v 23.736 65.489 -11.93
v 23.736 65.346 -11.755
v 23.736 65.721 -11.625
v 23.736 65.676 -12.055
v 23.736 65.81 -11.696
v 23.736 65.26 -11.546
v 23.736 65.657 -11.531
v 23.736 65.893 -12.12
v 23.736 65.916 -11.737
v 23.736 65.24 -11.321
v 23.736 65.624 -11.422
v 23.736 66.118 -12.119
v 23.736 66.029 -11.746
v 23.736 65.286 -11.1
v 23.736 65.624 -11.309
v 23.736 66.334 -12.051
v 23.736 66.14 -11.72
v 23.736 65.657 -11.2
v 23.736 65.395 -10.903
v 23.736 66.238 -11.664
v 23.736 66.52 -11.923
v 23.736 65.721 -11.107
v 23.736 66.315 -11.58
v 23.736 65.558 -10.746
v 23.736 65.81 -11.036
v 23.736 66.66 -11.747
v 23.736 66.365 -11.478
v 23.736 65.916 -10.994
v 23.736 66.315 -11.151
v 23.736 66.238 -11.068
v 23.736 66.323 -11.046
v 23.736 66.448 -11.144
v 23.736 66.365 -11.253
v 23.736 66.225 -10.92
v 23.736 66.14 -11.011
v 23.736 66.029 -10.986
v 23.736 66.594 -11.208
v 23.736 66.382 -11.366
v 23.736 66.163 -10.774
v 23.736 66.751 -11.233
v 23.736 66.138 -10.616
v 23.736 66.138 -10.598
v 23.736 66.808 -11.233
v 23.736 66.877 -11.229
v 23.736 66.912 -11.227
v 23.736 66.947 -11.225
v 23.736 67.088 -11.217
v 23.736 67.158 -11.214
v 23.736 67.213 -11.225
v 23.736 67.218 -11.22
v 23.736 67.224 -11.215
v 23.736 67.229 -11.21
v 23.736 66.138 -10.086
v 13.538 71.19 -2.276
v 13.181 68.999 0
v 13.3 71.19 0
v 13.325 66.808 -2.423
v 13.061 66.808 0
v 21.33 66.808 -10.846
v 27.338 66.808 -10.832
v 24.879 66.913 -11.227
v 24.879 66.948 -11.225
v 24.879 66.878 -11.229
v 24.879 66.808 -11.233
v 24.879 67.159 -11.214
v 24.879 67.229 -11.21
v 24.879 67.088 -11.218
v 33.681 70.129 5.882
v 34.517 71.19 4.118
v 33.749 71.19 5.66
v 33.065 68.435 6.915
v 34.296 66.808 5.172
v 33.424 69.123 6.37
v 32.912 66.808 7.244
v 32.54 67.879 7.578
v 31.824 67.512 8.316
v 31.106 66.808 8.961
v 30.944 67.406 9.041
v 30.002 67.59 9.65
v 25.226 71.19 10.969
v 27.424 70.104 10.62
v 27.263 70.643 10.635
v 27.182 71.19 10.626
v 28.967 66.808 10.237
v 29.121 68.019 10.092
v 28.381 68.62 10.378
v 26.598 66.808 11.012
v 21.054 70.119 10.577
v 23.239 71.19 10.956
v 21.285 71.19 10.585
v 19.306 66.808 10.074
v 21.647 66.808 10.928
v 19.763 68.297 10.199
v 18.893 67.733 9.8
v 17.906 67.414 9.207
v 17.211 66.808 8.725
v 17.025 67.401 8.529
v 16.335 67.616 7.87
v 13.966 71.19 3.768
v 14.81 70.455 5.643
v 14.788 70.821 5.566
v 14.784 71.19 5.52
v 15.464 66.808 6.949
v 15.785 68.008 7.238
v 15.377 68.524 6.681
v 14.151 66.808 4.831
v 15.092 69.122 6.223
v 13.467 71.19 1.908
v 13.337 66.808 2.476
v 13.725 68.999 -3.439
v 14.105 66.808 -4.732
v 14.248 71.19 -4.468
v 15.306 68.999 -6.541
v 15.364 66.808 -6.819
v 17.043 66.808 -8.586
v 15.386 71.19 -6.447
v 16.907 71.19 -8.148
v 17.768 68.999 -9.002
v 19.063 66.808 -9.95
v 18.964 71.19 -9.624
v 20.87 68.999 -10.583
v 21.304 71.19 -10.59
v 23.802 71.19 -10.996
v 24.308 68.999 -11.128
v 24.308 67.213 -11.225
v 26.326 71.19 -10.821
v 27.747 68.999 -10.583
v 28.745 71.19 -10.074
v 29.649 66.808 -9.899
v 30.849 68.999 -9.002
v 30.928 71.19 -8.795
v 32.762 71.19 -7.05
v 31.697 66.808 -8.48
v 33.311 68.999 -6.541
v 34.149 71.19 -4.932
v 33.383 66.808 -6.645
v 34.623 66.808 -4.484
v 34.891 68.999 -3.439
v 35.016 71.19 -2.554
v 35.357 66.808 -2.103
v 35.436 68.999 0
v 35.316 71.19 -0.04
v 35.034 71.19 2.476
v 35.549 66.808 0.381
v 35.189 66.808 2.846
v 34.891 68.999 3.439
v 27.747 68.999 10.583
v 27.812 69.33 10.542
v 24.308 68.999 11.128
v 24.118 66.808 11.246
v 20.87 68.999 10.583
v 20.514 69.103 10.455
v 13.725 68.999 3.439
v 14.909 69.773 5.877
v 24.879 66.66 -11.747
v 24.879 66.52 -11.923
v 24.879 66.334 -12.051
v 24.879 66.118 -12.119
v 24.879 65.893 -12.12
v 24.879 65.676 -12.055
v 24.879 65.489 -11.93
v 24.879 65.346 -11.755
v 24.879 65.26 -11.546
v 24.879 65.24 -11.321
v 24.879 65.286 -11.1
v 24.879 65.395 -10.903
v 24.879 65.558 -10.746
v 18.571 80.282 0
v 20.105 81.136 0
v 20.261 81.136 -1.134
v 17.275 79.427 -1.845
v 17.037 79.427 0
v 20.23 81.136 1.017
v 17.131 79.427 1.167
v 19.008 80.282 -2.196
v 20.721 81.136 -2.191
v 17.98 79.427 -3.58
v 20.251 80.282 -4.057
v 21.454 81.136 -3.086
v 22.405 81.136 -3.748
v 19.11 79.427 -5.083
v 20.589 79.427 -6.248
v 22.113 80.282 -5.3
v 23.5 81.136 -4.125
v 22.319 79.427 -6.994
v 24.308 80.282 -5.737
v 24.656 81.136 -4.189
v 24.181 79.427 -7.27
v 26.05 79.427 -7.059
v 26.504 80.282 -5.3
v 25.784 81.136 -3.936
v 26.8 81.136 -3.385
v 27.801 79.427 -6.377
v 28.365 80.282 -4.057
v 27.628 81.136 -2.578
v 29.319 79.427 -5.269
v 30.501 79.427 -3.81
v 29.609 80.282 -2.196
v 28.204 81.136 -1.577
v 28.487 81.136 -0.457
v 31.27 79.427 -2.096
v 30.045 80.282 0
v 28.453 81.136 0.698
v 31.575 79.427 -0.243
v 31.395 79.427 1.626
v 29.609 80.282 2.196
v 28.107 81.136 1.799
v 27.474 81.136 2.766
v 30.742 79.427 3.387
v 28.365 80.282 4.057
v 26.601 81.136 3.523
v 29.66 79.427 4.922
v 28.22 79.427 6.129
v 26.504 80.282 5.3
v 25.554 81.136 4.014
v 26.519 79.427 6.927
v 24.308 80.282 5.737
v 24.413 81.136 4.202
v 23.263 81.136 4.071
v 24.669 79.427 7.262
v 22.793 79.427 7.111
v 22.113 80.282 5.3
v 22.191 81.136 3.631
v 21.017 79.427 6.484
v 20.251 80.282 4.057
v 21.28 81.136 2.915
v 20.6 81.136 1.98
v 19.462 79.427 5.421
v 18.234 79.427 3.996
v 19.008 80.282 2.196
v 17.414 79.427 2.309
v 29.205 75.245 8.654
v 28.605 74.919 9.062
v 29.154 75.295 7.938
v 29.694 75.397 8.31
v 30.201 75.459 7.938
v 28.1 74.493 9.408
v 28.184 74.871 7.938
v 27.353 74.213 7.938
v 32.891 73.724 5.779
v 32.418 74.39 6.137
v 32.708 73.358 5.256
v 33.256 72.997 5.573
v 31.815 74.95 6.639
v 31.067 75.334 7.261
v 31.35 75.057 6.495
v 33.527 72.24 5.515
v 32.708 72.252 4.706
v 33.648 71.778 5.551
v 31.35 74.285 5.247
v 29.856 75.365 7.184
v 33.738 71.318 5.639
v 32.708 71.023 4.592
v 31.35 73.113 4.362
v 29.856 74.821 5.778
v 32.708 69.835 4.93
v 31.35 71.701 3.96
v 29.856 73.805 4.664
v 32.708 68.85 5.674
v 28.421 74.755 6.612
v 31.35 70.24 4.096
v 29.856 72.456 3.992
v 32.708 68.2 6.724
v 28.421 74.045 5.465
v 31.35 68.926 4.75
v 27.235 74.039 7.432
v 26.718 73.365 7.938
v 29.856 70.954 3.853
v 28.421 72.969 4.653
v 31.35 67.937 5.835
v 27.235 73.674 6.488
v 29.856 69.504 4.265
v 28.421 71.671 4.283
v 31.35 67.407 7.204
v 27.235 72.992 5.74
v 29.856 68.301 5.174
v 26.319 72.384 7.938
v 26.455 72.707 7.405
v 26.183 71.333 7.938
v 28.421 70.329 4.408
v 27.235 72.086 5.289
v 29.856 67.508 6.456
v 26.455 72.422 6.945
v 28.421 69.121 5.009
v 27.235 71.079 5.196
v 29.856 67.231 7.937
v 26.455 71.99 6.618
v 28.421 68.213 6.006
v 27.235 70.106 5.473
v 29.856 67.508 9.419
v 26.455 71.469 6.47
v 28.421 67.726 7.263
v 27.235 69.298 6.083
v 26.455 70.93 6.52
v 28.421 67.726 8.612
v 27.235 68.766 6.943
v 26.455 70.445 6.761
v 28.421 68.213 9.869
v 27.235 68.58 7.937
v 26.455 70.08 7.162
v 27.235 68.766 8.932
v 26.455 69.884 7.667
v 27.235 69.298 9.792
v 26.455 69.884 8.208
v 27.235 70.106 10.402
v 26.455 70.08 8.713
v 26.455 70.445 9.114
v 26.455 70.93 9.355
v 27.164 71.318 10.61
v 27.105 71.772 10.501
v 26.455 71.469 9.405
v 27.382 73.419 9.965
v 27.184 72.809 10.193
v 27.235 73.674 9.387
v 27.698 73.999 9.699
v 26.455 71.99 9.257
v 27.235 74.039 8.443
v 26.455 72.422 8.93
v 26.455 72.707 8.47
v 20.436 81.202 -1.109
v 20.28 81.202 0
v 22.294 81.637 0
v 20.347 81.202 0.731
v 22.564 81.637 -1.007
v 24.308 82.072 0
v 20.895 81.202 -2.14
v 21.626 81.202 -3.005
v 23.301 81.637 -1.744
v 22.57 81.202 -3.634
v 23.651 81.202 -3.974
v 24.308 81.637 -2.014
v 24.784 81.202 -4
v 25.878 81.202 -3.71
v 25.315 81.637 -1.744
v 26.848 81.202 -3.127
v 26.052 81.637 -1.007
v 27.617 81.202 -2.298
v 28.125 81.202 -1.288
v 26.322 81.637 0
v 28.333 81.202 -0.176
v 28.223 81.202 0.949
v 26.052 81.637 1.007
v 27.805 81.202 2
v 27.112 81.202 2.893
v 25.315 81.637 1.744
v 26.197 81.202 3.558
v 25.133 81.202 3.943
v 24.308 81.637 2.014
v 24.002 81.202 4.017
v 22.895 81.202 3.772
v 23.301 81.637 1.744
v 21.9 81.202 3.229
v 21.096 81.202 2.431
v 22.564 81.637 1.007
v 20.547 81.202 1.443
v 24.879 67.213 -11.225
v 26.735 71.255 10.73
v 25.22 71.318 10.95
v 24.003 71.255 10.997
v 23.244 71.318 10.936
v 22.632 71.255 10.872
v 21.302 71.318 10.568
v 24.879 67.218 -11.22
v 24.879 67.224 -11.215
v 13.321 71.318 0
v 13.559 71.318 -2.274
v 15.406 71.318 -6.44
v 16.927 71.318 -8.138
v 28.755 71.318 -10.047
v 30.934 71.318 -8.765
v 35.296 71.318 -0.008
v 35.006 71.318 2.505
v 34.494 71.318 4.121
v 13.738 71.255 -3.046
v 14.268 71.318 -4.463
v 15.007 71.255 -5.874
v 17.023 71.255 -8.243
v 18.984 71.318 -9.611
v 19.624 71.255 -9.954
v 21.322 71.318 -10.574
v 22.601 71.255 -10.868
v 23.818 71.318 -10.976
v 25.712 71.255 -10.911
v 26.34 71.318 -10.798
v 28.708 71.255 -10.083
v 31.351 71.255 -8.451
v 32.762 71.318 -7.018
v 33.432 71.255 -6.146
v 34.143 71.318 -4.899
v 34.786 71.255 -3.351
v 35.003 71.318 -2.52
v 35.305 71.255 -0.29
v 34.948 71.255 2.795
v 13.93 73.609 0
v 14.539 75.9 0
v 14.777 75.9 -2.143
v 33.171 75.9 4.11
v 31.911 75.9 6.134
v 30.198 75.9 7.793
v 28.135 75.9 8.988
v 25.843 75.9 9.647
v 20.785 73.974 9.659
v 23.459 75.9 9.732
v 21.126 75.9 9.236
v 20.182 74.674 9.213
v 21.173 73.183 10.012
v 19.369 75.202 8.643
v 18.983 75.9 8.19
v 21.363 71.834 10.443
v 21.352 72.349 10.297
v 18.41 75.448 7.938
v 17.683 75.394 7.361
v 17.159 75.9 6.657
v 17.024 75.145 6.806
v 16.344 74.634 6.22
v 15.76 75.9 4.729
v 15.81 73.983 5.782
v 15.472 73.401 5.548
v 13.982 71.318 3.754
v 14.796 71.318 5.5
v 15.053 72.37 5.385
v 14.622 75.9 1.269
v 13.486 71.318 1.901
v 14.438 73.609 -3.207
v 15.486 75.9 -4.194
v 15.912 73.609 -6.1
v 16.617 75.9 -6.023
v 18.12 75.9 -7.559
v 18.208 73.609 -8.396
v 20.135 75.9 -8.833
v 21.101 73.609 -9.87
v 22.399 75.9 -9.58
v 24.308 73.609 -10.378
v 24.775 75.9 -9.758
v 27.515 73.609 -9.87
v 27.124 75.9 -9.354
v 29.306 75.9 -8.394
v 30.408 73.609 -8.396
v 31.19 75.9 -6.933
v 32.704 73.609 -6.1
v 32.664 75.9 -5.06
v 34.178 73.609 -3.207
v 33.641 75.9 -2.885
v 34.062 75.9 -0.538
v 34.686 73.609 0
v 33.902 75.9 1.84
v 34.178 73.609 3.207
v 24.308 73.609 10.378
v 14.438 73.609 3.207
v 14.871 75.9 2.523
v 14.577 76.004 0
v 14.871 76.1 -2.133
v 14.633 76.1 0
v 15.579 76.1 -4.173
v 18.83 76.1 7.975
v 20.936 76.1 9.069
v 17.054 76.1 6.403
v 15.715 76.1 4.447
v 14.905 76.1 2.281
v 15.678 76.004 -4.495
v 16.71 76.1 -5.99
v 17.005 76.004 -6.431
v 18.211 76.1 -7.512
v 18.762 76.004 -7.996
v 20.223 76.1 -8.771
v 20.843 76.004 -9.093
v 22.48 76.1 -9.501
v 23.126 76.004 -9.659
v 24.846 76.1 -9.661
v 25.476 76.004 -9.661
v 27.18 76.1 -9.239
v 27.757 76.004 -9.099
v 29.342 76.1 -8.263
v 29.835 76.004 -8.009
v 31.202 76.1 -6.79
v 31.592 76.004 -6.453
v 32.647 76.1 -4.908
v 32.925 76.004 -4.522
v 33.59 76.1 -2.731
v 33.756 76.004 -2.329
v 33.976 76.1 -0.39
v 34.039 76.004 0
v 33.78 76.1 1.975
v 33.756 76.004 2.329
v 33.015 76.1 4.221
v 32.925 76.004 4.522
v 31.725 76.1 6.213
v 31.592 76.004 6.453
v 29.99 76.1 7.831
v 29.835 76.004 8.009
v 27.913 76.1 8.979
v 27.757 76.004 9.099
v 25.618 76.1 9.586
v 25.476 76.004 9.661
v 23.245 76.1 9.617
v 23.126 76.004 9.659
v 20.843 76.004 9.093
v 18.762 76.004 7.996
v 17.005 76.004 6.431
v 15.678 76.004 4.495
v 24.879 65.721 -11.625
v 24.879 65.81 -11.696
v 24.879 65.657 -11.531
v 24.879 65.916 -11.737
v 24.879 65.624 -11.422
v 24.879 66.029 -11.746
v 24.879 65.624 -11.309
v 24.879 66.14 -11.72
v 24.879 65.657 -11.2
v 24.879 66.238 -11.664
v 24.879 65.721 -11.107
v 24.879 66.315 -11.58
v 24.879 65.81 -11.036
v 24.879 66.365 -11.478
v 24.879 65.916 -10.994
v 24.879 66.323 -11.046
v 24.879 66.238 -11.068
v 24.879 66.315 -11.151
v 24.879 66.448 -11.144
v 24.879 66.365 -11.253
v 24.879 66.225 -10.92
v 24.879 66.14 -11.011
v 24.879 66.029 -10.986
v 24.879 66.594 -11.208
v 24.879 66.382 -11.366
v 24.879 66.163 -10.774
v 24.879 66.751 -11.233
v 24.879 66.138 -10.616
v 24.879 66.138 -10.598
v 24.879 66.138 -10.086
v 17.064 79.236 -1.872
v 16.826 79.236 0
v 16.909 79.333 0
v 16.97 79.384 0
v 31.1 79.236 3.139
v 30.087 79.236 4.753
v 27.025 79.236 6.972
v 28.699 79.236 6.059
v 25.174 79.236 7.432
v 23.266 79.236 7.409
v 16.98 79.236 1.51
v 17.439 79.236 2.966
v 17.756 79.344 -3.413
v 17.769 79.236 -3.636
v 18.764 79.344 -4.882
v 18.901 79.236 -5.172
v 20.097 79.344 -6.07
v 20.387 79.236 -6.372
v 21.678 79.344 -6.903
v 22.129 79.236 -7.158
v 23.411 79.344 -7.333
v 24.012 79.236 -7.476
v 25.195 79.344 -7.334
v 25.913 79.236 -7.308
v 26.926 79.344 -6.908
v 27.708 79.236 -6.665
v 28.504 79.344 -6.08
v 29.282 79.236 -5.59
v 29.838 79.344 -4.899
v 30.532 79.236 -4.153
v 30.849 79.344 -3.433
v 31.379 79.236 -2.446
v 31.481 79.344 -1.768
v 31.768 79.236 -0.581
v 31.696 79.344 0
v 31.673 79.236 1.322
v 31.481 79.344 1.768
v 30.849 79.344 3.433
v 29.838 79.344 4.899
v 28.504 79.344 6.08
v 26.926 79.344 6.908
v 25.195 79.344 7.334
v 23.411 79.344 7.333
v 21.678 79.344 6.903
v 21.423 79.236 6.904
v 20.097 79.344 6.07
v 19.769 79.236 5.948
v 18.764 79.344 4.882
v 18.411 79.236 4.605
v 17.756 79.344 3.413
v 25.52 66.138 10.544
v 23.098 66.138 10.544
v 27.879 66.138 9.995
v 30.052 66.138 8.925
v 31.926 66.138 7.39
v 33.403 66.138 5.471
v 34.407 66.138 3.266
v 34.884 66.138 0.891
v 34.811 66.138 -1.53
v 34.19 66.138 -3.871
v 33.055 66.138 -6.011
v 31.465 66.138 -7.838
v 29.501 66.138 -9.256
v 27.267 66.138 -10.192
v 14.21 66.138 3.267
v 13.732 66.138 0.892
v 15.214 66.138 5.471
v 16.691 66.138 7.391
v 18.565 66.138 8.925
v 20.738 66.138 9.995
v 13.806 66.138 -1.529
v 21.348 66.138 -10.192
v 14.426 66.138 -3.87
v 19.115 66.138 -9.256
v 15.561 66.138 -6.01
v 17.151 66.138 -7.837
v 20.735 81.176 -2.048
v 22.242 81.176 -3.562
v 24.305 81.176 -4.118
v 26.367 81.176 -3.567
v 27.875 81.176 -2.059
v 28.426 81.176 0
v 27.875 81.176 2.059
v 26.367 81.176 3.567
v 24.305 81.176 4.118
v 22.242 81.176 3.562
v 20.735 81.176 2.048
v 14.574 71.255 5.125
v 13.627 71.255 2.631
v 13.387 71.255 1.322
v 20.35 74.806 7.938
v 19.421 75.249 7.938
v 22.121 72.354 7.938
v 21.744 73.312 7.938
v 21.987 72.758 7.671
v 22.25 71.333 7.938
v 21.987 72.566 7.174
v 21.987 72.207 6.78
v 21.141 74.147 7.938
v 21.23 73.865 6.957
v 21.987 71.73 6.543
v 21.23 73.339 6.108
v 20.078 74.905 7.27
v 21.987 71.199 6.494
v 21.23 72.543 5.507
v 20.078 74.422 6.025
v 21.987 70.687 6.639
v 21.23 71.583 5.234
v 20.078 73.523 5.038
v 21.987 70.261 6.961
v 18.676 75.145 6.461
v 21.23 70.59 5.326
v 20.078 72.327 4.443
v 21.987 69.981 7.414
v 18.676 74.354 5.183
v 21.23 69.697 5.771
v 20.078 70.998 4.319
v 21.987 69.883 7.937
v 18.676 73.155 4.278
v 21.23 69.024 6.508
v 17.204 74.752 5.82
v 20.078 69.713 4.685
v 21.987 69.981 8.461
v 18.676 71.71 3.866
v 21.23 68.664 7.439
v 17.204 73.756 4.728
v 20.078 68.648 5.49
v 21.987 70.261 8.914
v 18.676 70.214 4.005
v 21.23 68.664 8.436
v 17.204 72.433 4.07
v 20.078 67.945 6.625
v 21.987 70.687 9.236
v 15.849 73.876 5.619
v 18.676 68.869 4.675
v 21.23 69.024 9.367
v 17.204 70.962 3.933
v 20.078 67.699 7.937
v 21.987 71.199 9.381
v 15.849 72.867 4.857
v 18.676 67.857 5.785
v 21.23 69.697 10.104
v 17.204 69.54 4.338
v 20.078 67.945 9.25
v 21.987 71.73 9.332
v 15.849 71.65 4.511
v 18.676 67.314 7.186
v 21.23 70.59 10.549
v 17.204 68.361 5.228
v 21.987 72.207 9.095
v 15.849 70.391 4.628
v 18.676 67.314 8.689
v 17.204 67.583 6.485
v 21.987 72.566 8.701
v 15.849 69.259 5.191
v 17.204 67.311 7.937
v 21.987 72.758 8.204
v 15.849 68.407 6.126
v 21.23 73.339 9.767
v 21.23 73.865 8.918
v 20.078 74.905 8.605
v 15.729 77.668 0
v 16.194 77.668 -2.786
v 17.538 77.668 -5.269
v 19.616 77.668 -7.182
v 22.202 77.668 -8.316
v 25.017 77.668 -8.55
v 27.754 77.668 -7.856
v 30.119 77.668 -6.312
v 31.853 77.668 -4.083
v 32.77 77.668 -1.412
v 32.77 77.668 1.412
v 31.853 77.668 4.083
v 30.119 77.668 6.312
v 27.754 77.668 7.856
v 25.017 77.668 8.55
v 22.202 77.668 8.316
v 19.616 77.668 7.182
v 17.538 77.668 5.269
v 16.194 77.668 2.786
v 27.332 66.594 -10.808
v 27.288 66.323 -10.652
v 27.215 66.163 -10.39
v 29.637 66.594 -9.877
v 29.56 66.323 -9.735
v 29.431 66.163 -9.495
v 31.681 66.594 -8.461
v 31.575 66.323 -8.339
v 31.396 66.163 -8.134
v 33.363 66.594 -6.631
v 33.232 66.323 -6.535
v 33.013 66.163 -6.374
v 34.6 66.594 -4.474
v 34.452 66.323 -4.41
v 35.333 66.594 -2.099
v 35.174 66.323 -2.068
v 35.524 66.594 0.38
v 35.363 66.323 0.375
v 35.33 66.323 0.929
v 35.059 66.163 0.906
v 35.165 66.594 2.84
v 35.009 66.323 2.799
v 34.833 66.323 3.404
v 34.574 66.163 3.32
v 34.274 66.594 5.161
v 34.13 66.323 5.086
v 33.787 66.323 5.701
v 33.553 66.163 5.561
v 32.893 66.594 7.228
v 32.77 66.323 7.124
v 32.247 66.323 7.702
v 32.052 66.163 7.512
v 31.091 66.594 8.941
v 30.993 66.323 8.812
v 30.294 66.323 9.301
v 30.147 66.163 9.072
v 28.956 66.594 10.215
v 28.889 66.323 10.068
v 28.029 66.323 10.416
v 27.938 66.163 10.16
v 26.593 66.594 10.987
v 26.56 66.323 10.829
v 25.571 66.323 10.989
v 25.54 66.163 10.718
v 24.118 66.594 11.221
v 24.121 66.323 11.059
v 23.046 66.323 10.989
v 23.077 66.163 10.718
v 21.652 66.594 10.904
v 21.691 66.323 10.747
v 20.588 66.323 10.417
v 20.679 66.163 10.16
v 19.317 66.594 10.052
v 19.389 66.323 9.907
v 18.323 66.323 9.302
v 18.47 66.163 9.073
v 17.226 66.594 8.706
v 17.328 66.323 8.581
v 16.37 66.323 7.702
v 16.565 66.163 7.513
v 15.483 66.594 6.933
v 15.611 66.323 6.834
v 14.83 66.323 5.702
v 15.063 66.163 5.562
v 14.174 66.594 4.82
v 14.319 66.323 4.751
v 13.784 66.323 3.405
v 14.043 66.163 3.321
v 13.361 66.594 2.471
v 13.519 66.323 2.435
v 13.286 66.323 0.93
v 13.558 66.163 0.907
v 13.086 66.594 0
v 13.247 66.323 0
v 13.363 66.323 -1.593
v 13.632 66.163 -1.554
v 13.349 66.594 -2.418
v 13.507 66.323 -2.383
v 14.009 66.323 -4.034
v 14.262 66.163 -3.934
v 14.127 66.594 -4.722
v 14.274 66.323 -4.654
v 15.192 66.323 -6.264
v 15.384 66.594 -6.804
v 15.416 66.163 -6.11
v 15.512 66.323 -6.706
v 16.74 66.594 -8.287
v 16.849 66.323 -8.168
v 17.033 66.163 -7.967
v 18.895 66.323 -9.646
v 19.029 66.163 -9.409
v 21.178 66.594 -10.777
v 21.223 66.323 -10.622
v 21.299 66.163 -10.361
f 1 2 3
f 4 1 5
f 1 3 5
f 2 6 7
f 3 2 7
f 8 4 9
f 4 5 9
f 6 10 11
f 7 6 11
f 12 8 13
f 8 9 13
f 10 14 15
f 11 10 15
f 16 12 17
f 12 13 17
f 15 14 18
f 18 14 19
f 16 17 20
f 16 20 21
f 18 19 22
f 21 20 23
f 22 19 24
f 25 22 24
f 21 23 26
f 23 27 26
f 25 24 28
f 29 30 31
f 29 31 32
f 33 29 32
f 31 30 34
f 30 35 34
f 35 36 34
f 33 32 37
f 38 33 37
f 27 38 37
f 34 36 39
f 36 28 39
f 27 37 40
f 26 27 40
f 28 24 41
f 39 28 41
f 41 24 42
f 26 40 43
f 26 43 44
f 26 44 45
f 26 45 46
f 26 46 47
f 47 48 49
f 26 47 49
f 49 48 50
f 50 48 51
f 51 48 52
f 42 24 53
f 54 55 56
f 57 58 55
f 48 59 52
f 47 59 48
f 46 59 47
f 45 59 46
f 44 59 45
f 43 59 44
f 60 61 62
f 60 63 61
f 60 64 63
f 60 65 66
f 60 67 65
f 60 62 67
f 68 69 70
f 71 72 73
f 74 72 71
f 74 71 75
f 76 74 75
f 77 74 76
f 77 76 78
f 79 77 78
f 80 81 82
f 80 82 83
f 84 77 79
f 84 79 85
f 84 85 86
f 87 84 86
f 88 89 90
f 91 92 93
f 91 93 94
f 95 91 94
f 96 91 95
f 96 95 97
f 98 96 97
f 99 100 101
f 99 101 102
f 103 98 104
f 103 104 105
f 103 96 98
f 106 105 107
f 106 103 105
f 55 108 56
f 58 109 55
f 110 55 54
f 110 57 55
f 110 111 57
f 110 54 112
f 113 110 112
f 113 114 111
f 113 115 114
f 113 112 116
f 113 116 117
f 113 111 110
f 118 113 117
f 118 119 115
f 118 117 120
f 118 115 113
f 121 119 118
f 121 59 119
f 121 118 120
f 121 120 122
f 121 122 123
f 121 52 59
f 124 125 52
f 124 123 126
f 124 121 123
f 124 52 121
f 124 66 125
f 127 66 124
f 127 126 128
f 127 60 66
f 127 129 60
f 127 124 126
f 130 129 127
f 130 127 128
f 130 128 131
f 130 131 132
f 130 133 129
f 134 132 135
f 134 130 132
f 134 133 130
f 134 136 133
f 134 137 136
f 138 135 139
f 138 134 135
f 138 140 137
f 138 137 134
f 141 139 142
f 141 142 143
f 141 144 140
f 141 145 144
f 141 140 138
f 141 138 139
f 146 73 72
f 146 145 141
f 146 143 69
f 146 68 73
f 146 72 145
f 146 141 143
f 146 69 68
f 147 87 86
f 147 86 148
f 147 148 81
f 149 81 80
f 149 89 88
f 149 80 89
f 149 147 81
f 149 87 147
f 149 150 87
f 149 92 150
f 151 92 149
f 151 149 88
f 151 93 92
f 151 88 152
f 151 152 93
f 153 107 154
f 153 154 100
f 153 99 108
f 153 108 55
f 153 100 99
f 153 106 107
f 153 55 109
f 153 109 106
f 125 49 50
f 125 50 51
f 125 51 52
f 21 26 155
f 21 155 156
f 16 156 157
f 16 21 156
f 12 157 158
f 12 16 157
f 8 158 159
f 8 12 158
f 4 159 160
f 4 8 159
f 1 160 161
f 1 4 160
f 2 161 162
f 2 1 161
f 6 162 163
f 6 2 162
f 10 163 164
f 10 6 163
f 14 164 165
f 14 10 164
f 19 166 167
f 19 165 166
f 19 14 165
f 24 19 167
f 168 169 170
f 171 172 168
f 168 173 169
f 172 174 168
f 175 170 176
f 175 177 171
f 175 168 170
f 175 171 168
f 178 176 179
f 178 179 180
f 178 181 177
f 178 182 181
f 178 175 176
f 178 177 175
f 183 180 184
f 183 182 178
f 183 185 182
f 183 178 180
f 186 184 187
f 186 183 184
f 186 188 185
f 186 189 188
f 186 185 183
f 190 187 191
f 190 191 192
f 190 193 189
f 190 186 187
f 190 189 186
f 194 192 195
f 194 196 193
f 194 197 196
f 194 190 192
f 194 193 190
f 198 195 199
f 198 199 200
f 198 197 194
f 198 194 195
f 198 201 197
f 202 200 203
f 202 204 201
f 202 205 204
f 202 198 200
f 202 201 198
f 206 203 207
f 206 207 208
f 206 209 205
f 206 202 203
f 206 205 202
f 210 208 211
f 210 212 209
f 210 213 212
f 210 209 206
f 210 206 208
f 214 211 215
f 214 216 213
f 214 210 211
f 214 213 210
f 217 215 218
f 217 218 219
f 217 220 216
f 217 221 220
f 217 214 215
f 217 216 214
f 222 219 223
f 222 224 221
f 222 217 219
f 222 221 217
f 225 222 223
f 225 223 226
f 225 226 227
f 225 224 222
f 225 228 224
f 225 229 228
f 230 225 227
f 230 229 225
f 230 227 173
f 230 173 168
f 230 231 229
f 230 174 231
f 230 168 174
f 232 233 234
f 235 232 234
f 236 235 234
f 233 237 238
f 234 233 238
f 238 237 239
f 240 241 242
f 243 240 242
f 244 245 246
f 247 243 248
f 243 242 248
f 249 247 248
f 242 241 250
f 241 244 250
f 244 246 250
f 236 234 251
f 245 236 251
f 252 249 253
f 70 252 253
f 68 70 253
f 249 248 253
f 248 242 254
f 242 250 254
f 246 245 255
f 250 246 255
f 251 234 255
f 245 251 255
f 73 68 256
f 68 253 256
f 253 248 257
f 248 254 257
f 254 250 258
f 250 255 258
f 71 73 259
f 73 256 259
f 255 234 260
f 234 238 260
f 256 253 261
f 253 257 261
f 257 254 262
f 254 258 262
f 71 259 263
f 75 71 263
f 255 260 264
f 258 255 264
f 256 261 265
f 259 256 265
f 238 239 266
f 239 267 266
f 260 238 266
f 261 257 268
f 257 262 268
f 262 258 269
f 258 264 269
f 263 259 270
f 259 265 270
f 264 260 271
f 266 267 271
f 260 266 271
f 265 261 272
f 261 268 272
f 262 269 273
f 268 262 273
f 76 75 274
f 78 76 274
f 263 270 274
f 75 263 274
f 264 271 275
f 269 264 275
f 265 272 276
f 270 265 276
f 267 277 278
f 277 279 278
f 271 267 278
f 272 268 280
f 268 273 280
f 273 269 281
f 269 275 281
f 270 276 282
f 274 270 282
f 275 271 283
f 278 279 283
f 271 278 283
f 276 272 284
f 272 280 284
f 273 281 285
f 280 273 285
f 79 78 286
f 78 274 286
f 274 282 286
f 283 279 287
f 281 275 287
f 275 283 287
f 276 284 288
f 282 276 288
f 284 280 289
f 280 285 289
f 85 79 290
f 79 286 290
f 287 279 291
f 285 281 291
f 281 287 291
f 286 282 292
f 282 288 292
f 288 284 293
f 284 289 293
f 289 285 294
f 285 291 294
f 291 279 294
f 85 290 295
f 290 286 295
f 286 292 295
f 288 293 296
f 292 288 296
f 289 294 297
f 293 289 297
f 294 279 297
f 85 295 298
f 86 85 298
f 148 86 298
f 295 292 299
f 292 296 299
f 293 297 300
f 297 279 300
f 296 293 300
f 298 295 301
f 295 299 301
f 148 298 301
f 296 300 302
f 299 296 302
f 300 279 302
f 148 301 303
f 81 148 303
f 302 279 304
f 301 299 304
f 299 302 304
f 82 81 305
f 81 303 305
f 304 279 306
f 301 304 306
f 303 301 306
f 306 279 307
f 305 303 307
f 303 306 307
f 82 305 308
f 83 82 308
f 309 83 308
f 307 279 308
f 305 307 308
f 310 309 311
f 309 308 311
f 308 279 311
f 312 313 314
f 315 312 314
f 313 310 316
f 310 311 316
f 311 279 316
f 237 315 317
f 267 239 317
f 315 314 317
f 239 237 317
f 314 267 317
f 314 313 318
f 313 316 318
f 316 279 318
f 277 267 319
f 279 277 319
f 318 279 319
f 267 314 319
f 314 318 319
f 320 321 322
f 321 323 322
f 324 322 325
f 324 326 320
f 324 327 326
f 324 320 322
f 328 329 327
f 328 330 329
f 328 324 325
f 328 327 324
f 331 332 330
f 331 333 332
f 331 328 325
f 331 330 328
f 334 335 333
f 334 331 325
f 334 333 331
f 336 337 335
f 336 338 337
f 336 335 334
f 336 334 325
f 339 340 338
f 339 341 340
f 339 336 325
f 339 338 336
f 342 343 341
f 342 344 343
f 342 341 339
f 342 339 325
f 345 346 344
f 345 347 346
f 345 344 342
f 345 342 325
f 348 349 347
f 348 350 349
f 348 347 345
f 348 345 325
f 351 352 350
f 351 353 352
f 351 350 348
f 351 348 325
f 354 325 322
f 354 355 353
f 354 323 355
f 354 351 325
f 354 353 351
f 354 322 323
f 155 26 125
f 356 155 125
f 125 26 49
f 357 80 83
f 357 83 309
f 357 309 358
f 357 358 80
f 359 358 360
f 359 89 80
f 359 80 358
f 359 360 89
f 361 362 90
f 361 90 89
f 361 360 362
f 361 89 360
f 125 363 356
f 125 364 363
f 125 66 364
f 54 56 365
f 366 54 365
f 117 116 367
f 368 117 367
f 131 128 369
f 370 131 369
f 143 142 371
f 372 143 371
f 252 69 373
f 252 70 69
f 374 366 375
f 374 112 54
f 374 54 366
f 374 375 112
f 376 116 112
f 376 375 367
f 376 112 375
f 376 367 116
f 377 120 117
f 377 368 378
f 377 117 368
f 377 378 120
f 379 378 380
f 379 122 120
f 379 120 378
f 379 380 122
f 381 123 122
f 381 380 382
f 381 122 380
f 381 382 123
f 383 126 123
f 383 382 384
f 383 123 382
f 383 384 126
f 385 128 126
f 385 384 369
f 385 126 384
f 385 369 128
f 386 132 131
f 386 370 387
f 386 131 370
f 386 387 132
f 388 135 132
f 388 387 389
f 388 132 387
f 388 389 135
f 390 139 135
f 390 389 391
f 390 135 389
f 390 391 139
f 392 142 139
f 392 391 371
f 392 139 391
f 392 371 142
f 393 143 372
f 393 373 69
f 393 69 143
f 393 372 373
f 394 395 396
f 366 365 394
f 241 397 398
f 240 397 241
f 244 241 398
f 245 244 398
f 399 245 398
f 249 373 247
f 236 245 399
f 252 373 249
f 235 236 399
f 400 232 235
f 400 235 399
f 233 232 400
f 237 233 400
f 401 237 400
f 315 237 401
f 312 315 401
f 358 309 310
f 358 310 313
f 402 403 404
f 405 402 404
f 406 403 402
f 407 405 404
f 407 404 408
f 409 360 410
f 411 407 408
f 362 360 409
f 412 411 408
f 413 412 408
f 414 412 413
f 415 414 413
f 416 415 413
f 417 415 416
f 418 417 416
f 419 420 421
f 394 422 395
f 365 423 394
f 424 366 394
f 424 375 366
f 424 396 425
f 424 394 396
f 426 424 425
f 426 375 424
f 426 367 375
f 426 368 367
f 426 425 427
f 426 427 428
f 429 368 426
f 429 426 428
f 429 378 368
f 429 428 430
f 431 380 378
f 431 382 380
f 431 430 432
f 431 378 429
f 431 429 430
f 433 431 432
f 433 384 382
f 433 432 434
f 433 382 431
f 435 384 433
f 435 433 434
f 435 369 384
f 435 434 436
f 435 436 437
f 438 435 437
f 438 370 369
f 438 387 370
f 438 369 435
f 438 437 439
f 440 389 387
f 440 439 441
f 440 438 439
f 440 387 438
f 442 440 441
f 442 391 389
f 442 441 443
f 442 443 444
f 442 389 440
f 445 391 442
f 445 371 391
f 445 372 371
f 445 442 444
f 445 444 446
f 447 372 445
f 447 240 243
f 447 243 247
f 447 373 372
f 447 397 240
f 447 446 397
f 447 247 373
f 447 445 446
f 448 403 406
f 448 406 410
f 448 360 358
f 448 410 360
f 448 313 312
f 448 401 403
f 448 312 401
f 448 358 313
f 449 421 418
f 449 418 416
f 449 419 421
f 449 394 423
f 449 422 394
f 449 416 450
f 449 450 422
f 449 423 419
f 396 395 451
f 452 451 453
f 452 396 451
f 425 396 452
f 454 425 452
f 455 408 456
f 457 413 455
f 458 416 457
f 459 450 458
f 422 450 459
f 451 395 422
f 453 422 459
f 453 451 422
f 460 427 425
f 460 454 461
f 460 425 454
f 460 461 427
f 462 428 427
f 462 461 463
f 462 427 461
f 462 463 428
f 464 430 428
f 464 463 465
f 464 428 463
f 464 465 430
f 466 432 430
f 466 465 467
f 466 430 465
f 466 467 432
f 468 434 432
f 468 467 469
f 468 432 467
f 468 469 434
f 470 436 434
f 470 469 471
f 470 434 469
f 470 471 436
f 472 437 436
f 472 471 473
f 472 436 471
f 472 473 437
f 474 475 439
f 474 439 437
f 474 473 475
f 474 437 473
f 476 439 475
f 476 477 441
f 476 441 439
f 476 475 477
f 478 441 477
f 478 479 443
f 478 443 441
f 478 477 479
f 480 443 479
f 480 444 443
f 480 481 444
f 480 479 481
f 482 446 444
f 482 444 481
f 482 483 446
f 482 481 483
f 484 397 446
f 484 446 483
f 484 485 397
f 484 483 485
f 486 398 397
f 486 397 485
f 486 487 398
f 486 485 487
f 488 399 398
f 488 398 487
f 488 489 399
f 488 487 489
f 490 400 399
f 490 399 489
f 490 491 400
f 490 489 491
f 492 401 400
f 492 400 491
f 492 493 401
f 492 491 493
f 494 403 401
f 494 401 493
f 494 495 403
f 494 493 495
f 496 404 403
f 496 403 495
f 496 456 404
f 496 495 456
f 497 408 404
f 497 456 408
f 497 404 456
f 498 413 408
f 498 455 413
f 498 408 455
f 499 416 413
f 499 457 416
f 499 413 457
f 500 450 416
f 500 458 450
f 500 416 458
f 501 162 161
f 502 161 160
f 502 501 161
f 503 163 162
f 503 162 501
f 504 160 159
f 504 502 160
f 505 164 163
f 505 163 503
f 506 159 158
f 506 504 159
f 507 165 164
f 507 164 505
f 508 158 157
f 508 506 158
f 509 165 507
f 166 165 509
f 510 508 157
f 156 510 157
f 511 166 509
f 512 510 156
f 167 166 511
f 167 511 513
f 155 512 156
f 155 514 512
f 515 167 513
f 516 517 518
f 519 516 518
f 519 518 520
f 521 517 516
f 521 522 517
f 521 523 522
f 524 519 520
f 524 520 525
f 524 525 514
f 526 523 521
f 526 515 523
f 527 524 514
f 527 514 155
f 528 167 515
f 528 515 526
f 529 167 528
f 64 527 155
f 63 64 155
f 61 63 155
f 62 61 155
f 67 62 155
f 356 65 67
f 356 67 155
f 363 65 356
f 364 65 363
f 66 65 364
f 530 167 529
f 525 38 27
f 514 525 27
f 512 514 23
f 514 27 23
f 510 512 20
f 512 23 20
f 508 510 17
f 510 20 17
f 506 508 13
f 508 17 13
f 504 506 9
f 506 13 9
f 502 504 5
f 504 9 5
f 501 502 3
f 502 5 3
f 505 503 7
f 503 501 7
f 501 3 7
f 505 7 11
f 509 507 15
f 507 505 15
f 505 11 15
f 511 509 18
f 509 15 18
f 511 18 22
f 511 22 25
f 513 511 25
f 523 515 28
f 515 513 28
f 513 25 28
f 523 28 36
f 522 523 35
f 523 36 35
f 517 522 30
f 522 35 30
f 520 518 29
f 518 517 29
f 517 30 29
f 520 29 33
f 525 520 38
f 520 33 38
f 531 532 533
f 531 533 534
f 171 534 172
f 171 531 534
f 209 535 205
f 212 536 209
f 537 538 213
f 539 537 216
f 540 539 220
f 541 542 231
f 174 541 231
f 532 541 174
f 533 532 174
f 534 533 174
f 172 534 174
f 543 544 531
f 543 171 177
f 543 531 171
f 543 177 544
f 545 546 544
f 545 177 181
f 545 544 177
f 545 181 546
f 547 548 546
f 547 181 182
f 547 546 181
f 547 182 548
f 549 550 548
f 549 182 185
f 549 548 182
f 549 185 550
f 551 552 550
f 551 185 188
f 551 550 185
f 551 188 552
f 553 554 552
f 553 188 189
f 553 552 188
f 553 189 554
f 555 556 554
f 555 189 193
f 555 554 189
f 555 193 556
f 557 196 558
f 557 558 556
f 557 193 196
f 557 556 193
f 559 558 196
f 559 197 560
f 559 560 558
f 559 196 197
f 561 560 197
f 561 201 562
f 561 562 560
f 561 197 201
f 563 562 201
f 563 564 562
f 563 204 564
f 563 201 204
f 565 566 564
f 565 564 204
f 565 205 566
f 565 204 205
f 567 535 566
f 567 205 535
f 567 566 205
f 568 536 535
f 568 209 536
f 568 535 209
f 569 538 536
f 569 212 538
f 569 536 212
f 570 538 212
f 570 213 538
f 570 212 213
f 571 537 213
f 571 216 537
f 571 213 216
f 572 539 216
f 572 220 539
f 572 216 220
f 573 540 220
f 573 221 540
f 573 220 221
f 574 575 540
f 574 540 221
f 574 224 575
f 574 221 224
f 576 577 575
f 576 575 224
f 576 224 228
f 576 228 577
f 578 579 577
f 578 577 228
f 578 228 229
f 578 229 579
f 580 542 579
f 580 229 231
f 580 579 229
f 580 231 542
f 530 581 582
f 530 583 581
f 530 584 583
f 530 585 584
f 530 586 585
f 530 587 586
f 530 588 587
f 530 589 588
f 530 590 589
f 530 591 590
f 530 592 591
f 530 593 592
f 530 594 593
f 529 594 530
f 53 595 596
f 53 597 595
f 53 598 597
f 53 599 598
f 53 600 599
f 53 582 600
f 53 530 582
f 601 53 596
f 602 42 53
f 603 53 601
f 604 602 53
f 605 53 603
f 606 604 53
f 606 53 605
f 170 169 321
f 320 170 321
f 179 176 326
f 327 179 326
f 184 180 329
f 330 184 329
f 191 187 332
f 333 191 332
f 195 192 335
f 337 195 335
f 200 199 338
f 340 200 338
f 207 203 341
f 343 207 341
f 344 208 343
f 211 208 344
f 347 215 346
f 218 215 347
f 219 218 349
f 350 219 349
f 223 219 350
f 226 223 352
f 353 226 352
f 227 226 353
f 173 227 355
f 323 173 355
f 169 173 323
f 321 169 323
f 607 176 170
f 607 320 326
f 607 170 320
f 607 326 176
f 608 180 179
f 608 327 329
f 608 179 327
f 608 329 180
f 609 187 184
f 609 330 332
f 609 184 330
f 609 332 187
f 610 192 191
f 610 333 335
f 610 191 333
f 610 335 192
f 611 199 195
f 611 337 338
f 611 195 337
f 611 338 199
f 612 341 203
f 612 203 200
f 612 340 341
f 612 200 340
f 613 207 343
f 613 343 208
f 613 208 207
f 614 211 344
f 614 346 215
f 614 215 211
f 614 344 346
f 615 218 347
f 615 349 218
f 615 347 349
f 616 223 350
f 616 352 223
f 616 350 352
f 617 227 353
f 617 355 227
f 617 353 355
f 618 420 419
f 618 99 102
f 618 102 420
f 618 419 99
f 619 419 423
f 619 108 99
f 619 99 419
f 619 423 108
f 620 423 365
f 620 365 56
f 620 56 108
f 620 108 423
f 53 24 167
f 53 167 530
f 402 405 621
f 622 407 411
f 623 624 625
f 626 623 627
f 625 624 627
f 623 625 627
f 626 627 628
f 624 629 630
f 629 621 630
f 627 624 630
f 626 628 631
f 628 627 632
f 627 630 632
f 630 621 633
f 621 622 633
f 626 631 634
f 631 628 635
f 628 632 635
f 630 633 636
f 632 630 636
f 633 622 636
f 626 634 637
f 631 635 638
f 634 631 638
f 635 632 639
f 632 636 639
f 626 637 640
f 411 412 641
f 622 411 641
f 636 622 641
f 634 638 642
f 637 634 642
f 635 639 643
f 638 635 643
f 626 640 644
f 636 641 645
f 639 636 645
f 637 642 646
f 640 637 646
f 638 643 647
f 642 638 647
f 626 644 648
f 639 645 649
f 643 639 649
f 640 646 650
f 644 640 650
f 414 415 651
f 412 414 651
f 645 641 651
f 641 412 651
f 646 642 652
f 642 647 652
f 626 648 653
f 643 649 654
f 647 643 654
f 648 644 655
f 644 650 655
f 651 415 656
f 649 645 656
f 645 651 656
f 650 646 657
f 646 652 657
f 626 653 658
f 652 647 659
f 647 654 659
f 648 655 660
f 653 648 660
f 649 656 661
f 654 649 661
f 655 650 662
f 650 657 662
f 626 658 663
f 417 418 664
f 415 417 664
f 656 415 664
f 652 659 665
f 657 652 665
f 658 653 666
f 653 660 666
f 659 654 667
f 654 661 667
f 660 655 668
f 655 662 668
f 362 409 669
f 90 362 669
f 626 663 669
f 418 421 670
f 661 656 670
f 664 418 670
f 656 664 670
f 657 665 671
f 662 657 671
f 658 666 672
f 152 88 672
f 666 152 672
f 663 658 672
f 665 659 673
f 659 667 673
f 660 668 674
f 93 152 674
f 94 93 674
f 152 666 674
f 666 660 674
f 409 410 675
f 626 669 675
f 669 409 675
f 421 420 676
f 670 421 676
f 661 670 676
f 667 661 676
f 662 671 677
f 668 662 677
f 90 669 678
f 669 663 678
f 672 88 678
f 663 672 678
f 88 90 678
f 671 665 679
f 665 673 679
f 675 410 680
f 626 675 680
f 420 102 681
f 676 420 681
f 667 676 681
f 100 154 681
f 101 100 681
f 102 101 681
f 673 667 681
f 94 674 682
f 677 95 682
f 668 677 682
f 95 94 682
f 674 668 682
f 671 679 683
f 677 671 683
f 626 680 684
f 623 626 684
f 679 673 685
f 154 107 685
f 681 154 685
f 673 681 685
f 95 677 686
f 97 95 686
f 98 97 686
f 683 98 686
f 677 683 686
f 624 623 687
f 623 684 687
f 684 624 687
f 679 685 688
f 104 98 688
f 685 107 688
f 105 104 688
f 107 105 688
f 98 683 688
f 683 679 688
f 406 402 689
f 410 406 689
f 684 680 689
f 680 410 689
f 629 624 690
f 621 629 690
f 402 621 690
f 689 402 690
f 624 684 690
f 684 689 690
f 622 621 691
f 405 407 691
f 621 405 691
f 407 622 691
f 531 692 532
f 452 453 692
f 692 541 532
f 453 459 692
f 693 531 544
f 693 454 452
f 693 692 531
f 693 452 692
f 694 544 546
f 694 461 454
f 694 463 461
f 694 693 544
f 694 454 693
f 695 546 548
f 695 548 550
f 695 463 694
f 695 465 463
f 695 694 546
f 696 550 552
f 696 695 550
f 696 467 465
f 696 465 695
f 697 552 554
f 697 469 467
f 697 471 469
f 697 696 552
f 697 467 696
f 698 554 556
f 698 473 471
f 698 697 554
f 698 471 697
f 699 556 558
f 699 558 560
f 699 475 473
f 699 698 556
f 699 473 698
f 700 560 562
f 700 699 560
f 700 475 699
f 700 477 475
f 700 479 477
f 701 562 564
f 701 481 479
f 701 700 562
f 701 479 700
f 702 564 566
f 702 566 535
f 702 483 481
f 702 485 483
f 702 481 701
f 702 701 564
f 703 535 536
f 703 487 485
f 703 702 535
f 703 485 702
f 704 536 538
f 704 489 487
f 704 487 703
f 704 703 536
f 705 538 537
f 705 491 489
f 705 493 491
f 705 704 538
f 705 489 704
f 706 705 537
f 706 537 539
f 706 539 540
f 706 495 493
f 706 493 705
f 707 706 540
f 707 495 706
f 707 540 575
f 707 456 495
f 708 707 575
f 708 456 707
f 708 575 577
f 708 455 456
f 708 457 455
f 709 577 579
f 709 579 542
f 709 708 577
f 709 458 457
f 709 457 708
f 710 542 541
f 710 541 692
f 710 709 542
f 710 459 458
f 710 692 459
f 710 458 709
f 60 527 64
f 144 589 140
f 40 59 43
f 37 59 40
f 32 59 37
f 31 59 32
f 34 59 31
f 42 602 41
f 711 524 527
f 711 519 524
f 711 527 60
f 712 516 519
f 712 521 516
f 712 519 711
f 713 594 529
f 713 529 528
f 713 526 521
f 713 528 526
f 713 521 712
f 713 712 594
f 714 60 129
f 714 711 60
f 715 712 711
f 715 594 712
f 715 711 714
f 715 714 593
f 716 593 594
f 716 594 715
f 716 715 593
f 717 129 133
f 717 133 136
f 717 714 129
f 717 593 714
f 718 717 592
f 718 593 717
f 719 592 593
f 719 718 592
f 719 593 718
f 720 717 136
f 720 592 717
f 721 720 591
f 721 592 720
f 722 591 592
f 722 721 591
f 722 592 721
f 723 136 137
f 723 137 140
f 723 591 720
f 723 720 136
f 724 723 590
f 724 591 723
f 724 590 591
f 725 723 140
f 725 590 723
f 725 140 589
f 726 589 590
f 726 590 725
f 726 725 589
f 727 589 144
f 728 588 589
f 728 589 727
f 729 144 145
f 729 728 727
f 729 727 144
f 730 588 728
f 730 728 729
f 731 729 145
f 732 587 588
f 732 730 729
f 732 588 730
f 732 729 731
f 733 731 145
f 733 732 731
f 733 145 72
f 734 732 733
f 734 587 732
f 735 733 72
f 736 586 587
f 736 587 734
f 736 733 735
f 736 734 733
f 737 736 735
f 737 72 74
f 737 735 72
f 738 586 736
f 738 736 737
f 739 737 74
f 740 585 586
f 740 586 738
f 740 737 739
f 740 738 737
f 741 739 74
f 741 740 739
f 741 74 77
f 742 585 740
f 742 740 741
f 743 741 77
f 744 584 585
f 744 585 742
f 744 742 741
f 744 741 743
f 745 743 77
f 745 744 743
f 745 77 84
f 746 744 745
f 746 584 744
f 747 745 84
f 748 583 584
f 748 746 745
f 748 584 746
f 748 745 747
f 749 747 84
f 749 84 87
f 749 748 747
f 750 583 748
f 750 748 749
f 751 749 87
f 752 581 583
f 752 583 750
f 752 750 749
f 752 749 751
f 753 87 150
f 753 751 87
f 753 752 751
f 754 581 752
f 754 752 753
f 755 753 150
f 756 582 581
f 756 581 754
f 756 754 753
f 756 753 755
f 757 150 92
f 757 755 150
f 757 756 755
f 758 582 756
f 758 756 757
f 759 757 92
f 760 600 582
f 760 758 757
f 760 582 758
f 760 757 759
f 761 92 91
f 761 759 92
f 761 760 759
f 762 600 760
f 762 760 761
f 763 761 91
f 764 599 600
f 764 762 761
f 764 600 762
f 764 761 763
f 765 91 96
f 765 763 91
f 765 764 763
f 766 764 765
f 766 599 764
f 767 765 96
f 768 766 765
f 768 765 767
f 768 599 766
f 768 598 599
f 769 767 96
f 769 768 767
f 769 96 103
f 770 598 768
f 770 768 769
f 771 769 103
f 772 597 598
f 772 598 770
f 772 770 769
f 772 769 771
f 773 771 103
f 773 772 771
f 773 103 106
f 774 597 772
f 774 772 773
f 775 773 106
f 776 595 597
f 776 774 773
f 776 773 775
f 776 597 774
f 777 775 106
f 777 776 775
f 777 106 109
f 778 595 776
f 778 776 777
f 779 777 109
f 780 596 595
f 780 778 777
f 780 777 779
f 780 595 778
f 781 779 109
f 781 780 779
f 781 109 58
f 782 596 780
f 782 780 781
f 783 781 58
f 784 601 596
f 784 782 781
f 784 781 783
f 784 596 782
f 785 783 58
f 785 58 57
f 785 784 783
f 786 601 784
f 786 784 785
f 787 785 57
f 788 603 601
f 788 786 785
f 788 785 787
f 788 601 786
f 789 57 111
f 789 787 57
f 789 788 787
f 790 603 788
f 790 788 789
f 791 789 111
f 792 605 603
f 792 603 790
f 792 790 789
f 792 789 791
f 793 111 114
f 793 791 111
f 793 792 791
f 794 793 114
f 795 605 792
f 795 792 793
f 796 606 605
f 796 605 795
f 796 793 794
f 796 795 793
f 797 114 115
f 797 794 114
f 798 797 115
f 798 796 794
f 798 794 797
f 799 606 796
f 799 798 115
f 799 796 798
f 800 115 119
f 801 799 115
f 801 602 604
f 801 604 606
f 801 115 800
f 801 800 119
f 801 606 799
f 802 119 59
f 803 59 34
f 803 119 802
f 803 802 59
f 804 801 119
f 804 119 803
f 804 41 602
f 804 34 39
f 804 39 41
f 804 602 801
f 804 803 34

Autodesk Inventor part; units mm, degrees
ref_plane "XZ Plane" through (0, 0, 0) normal (0, 1, 0) x (-1, 0, 0)
sketch "Sketch1" plane through (0, 0, 0) normal (0, 0, 1) x (1, 0, 0)
  line L0 (1.9155, 84.5388) -> (46.3655, 84.5388) construction
  line L1 (46.3655, 84.5388) -> (46.3655, 1.9888) construction
  line L2 (46.3655, 1.9888) -> (1.9155, 1.9888) construction
  line L3 (1.9155, 1.9888) -> (1.9155, 84.5388) construction
  line L4 (13.0242, 66.1379) -> (35.273, 66.1379)
  line L5 (13.0242, 66.1379) -> (13.304, 71.2552)
  line L6 (13.304, 71.2552) -> (14.5683, 76.0081)
  line L7 (14.5683, 76.0081) -> (16.9096, 79.3562)
  line L8 (16.9096, 79.3562) -> (20.1875, 81.1824)
  line L9 (20.1875, 81.1824) -> (24.3082, 82.0721)
  line L10 (24.3082, 82.0721) -> (24.3082, 66.1379)
  line L11 (35.5922, 66.1379) -> (35.3124, 71.2552)
  line L12 (35.3124, 71.2552) -> (34.0481, 76.0081)
  line L13 (34.0481, 76.0081) -> (31.7068, 79.3562)
  line L14 (31.7068, 79.3562) -> (28.4289, 81.1824)
  line L15 (28.4289, 81.1824) -> (24.3082, 82.0721)
  point P0 (0, 0)
revolve "Revolution1" add sketch "Sketch1" angle 360 about axis through (24.3082, 82.0721, 0) along (0, -1, 0)
fillet "Fillet1" radius 0.635 5 edges at (35.5922, 66.1379, 0) (35.3124, 71.2552, 0) (34.0481, 76.0081, 0) (31.7068, 79.3562, 0) (28.4289, 81.1824, 0)
ref_plane "Work Plane1" through (0, 0, 7.9375) normal (0, 0, 1) x (1, 0, 0)
sketch "Sketch2" plane through (0, 0, 7.9375) normal (0, 0, 1) x (1, 0, 0)
  line L0 (1.9442, 84.5823) -> (46.3942, 84.5823) construction
  line L1 (46.3942, 84.5823) -> (46.3942, 2.0323) construction
  line L2 (46.3942, 2.0323) -> (1.9442, 2.0323) construction
  line L3 (1.9442, 2.0323) -> (1.9442, 84.5823) construction
  circle A0 centre (18.1243, 71.3329) radius 4.1255
  circle A1 centre (30.3101, 71.3329) radius 4.1275
  line L4 (18.1243, 71.3329) -> (30.3101, 71.3329)
  line L5 (30.3101, 71.3329) -> (34.4376, 71.3329)
  line L6 (18.1243, 71.3329) -> (13.9988, 71.3329)
  point P0 (0, 0)
  point P1 (26.1826, 71.3329)
  point P2 (22.2498, 71.3329)
  dimension "d11" = 8.251
  dimension "d12" = 8.255
revolve "Revolution2" cut sketch "Sketch2" angle 360 about axis through (18.1243, 71.3329, 7.9375) along (1, 0, 0) picked at (15.4139, 71.662) picked at (28.062, 72.8846) contours L4 L6 A0 | A1 L5 L4
ref_plane "Work Plane2" through (24.3078, 0, 0) normal (1, 0, 0) x (0, 1, 0)
sketch "Sketch3" plane through (24.3078, 0, 0) normal (1, 0, 0) x (0, 1, 0)
  line L0 (83.2138, 13.5179) -> (83.2138, -13.8458) construction
  line L1 (83.2138, -13.8458) -> (60.6921, -13.8458) construction
  line L2 (60.6921, -13.8458) -> (60.6921, 13.5179) construction
  line L3 (60.6921, 13.5179) -> (83.2138, 13.5179) construction
  circle A0 centre (66.0006, -11.3657) radius 0.762
  circle A1 centre (66.0006, -11.3657) radius 0.381
  line L4 (66.1379, -10.6133) -> (66.1379, 10.6133) projected
  line L5 (66.6605, -11.7467) -> (67.213, -11.2252)
  line L6 (71.1899, -11.0078) -> (66.8076, -11.2474) projected
  line L7 (66.1379, -10.0536) -> (66.1379, -10.6133)
  line L8 (67.213, -11.2252) -> (66.7496, -11.2252)
  line L9 (65.5576, -10.7458) -> (66.1379, -10.0864)
  line L10 (66.1379, -10.0864) -> (66.1379, -10.6162)
  arc A2 (67.213, -11.2252) -> (66.1379, -10.0864) centre (66.6755, -10.6558) ccw
  point P0 (0, 0)
  dimension "d19" = 1.524
  dimension "d20" = 0.762
extrude "Extrusion1" add sketch "Sketch3" along normal mid plane 1.143
properties part number "Head_3DPrint"
